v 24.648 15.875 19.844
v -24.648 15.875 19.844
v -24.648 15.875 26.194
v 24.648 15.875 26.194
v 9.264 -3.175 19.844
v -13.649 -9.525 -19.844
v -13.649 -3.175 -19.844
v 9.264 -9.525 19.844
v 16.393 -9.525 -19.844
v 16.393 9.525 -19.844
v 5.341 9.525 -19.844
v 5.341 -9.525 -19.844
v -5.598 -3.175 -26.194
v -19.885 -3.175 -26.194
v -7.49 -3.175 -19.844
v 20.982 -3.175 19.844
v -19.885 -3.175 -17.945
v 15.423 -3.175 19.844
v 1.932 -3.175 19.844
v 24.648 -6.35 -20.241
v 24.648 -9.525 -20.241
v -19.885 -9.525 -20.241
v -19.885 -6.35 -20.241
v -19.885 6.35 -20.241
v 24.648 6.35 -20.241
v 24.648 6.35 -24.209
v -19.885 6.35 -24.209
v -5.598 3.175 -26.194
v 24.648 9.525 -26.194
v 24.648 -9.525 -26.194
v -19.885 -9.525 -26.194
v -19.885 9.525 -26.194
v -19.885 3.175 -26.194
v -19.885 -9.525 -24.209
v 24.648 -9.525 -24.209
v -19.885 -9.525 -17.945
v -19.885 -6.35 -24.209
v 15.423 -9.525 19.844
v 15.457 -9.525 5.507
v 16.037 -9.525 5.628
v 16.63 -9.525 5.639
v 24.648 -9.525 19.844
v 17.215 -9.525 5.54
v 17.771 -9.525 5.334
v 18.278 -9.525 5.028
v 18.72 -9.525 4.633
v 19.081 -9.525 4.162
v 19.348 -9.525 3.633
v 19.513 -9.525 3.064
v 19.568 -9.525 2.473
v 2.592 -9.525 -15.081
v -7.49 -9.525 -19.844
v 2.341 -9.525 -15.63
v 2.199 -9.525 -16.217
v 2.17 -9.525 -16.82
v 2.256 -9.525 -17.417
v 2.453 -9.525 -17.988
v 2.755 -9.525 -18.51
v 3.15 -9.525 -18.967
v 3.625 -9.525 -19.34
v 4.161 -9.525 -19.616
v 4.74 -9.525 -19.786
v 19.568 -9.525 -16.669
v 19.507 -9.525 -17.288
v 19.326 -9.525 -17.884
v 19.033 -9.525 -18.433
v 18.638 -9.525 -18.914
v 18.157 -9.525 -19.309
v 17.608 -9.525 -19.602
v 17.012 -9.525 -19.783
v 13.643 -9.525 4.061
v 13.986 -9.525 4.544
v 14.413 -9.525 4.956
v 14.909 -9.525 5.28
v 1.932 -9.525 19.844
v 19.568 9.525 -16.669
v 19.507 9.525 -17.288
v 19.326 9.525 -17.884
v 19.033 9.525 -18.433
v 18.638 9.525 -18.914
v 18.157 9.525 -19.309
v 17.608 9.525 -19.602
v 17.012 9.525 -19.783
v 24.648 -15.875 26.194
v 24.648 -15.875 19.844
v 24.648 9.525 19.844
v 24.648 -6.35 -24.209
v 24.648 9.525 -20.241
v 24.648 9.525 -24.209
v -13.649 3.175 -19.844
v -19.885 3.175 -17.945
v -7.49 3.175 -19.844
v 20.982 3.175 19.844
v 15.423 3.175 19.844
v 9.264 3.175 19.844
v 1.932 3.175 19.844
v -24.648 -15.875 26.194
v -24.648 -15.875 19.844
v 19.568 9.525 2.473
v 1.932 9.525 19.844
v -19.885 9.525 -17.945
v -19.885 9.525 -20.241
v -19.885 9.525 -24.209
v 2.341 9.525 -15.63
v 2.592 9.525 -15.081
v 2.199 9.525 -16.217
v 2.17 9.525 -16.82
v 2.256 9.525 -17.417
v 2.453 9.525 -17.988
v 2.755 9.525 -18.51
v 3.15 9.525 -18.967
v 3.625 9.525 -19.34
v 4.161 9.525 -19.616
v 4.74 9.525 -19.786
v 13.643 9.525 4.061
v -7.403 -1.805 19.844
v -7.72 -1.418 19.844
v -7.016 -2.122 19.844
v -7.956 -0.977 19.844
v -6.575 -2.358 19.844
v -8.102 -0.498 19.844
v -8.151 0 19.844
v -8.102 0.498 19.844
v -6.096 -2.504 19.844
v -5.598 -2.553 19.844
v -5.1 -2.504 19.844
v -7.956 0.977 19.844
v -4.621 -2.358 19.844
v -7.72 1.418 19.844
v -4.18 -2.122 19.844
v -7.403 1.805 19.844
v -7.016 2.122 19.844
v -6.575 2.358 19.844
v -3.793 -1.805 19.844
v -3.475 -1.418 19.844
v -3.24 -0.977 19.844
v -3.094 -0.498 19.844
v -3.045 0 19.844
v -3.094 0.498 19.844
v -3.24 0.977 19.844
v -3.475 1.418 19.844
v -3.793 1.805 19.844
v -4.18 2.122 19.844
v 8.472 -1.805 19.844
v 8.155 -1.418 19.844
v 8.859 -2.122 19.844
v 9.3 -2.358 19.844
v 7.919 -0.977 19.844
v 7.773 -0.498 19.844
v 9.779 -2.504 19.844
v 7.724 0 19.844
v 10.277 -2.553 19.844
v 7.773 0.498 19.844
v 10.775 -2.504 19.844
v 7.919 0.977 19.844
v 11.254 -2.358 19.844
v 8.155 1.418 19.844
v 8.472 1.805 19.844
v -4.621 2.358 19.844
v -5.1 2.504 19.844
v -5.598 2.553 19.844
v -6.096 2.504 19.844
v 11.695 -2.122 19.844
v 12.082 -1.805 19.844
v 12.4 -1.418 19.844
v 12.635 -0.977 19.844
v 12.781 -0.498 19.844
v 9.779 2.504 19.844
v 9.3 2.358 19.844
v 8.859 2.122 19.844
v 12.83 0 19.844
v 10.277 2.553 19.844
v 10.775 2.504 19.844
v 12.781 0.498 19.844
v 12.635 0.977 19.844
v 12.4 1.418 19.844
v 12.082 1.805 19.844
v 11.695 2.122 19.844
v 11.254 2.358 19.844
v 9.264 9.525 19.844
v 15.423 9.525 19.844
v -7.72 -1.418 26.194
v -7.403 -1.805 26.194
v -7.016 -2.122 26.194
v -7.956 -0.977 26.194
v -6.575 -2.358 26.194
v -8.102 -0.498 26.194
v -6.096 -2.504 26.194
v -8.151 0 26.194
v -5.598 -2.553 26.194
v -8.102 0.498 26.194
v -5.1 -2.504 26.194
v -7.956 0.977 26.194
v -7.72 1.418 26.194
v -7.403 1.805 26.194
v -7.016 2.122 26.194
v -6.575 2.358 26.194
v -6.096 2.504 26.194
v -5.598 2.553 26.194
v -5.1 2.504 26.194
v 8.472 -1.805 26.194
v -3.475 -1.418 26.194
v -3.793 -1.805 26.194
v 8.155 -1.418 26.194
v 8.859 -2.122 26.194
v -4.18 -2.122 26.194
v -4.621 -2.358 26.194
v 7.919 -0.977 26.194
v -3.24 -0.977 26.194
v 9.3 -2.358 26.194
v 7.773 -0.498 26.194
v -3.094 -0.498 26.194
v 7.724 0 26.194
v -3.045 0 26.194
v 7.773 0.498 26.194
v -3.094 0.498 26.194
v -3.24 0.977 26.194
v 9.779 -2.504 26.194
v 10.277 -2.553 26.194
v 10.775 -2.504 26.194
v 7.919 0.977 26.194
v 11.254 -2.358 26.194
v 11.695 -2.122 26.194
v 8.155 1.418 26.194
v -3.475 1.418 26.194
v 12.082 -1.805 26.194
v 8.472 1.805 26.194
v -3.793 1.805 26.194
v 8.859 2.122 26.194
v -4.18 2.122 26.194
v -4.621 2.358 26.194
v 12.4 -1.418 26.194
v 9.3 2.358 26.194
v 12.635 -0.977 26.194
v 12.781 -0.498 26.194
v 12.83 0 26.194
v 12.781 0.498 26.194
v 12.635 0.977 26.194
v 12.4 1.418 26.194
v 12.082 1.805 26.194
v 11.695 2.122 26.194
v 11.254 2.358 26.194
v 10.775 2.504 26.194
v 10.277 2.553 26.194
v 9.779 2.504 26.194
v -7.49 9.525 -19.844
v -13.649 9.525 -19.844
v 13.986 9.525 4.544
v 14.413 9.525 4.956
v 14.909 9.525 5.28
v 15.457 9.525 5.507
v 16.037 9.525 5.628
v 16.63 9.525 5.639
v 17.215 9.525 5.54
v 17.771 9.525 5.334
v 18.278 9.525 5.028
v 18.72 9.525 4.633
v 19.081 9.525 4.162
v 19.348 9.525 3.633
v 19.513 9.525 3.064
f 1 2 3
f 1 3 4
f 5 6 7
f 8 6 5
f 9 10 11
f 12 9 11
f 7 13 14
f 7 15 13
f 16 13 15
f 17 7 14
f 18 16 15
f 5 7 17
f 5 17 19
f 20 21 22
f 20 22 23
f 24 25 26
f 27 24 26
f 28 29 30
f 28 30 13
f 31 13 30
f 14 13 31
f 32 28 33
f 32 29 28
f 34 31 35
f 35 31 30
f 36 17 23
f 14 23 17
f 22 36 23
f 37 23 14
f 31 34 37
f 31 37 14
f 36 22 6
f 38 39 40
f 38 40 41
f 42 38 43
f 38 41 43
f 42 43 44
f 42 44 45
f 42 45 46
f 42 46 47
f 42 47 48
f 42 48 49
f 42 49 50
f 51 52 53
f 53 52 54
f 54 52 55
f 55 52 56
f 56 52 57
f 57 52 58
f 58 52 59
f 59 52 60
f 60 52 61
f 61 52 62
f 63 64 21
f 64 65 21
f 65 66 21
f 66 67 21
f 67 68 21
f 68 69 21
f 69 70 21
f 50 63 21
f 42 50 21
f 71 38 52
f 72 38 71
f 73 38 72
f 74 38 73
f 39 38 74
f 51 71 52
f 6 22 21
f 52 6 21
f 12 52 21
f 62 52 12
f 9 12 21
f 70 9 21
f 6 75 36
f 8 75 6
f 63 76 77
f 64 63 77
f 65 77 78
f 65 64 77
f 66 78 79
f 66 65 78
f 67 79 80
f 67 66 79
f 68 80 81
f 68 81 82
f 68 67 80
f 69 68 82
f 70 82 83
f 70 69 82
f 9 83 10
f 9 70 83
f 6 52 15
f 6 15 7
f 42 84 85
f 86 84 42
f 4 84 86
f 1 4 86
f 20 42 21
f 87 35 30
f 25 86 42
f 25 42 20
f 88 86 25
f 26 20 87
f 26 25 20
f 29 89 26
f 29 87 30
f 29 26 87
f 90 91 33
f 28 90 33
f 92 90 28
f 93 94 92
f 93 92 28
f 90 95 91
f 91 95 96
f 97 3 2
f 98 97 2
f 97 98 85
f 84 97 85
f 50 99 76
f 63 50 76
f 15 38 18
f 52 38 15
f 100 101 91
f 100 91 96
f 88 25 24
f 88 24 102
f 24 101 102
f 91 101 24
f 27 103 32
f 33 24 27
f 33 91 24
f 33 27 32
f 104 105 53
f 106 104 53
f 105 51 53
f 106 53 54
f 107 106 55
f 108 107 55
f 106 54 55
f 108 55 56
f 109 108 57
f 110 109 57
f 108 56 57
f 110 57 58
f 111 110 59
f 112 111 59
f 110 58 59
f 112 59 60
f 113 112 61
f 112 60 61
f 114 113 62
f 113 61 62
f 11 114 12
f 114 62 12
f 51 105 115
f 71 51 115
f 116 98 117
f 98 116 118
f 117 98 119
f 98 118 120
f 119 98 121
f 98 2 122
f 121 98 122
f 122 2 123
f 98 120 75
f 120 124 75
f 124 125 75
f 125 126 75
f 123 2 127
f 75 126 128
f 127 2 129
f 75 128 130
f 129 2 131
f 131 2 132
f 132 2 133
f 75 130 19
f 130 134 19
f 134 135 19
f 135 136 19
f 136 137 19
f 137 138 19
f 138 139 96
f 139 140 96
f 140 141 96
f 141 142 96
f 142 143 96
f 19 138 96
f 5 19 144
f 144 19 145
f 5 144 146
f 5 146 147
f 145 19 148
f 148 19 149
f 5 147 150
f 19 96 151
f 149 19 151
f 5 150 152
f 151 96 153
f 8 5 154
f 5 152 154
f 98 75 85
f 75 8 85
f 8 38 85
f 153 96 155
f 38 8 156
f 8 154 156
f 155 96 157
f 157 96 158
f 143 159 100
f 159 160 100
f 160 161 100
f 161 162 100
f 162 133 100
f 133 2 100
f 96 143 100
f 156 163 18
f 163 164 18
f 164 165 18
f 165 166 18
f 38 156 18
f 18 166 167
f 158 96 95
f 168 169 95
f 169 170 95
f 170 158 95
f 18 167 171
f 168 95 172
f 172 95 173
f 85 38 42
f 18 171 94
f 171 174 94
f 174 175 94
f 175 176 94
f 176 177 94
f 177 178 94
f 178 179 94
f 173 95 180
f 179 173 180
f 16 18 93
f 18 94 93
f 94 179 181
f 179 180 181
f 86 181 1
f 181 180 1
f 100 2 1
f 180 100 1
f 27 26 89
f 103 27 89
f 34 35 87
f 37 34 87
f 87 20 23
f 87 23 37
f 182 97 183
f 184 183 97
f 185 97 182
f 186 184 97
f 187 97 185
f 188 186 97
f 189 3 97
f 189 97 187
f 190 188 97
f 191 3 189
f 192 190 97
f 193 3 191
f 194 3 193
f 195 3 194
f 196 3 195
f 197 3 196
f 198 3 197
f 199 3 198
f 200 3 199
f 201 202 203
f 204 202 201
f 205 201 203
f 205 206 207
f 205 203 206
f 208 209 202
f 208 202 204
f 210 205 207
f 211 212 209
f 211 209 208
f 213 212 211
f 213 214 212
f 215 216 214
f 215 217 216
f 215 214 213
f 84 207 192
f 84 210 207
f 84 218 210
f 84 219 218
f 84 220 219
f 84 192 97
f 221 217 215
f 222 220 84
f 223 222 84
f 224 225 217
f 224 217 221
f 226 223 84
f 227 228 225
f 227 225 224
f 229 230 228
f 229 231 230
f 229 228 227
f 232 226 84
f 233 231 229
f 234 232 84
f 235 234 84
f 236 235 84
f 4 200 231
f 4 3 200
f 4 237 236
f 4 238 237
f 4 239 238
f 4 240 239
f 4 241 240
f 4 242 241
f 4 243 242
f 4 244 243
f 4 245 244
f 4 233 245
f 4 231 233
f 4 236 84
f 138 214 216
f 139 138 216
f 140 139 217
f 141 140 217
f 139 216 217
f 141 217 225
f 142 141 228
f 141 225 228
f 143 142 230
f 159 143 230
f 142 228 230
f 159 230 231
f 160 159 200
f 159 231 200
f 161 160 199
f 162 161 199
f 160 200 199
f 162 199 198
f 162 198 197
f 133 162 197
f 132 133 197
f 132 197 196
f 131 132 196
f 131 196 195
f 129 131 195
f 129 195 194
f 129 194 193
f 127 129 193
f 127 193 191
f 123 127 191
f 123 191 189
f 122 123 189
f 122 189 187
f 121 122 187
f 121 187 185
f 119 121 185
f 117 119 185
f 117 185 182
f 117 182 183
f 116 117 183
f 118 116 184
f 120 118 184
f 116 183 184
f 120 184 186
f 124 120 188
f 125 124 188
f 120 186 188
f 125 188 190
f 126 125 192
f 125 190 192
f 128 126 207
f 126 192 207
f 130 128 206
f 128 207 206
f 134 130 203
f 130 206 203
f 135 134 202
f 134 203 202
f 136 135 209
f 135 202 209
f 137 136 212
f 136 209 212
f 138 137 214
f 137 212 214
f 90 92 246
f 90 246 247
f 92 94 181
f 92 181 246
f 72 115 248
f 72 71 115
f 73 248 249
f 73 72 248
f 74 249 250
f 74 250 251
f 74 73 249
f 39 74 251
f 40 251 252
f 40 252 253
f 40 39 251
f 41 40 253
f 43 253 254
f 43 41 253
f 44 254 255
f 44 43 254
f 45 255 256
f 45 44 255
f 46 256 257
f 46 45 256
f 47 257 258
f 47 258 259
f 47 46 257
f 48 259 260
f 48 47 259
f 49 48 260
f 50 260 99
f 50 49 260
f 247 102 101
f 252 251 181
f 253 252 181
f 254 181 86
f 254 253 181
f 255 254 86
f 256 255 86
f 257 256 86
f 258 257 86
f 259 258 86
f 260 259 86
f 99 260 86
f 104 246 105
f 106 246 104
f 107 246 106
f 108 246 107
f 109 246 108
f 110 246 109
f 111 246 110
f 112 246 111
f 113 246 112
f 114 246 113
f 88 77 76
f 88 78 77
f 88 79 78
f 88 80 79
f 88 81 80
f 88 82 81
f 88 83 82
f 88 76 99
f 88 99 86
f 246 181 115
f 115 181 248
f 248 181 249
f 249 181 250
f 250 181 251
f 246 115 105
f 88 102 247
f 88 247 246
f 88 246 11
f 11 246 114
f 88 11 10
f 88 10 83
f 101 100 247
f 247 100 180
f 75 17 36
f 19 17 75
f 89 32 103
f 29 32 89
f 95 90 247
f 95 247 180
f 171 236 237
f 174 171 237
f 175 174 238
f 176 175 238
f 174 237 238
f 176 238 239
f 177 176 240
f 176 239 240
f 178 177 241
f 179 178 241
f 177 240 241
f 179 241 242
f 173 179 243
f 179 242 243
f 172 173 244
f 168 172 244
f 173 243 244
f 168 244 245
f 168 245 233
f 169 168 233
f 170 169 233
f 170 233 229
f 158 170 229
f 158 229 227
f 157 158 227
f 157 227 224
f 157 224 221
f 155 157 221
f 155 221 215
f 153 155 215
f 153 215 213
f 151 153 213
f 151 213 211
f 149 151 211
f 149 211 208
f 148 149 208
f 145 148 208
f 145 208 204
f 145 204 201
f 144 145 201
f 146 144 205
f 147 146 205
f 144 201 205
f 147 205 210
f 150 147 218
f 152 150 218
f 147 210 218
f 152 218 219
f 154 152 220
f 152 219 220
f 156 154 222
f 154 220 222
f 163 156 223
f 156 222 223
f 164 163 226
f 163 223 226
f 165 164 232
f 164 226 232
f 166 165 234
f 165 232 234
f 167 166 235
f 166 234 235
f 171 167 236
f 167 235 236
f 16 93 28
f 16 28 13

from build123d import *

# Parameters (mm, degrees)
BOSS_EXTRUDE1_DEPTH     = 9.525
SKETCH2_3_W             = 49.295937228
SKETCH2_3_H             = 6.35
BOSS_EXTRUDE2_DEPTH     = 15.875
SKETCH10_W              = 19.05
SKETCH10_H              = 6.35
CUT_EXTRUDE1_DEPTH      = 45.031748726
CUT_EXTRUDE1_DEPTH_BACK = 45.031748726
CUT_EXTRUDE2_DEPTH      = 45.031748726
CUT_EXTRUDE2_DEPTH_BACK = 45.031748726
CUT_EXTRUDE3_REACH      = 62.033
SKETCH14_R              = 2.5527
CUT_EXTRUDE4_DEPTH      = 45.031748726
FILLET1_R               = 3.175
SKETCH17_W              = 3.96875
SKETCH17_H              = 3.175
CUT_EXTRUDE5_DEPTH      = 59.036347156


with BuildPart() as part:
    # Sketch2 → Boss-Extrude1 (new, symmetric)
    with BuildSketch(Plane(origin=(0, 0, 0), x_dir=(1, 0, 0), z_dir=(0, 1, 0))):
        Polygon((24.647968614, 26.19375), (-24.647968614, 26.19375), (1.931794404, -19.84375), (24.647968614, -19.84375), align=None)
    extrude(amount=BOSS_EXTRUDE1_DEPTH, both=True)

    # Sketch2<3> → Boss-Extrude2 (add, symmetric)
    with BuildSketch(Plane(origin=(0, 0, 0), x_dir=(1, 0, 0), z_dir=(0, 1, 0))):
        with Locations((0, -23.01875)):
            Rectangle(SKETCH2_3_W, SKETCH2_3_H)
    extrude(amount=BOSS_EXTRUDE2_DEPTH, both=True)

    # Cut-Sweep1: sweep along a curve in space
    with BuildLine() as cut_sweep1_path:
        Line((-24.647968614, 9.525, -26.19375), (1.931794404, 9.525, 19.84375))
    # Sketch10 → Cut-Sweep1 (sweep, cut)
    with BuildSketch(Plane(origin=(0, 0, -26.19375), x_dir=(-1, 0, 0), z_dir=(0, 0, -1))):
        with Locations((15.122968614, 0)):
            Rectangle(SKETCH10_W, SKETCH10_H)
    sweep(path=cut_sweep1_path.line, mode=Mode.SUBTRACT)

    # Sketch11 → Cut-Extrude1 (cut, two sides: drawn at the far end of the back side and taken through both)
    with BuildSketch(Plane(origin=(0, 9.525, 0), x_dir=(1, 0, 0), z_dir=(0, 1, 0)).offset(-CUT_EXTRUDE1_DEPTH_BACK)):
        Polygon((-19.885468614, 26.19375), (-24.647968614, 26.19375), (-19.885468614, 17.944858029), align=None)
    extrude(amount=CUT_EXTRUDE1_DEPTH + CUT_EXTRUDE1_DEPTH_BACK, mode=Mode.SUBTRACT)

    # Sketch13 → Cut-Extrude2 (cut, two sides: drawn at the far end of the back side and taken through both)
    with BuildSketch(Plane(origin=(0, 9.525, 0), x_dir=(1, 0, 0), z_dir=(0, 1, 0)).offset(-CUT_EXTRUDE2_DEPTH_BACK)):
        Polygon((-13.649445986, 19.84375), (9.264142823, -19.84375), (15.423315495, -19.84375), (-7.490273314, 19.84375), align=None)
    extrude(amount=CUT_EXTRUDE2_DEPTH + CUT_EXTRUDE2_DEPTH_BACK, mode=Mode.SUBTRACT)

    # Sketch14 → Cut-Extrude3 (cut, up to next)
    with BuildSketch(Plane.XY.offset(26.19375), mode=Mode.PRIVATE) as cut_extrude3_sk1:
        with Locations((10.277031386, 0)):
            Circle(SKETCH14_R)
    cut_extrude3_tool1 = extrude(cut_extrude3_sk1.sketch, amount=-CUT_EXTRUDE3_REACH, mode=Mode.PRIVATE) & part.part
    # Sketch14 → Cut-Extrude3 (cut, up to next)
    with BuildSketch(Plane.XY.offset(26.19375), mode=Mode.PRIVATE) as cut_extrude3_sk2:
        with Locations((-5.597968614, 0)):
            Circle(SKETCH14_R)
    cut_extrude3_tool2 = extrude(cut_extrude3_sk2.sketch, amount=-CUT_EXTRUDE3_REACH, mode=Mode.PRIVATE) & part.part
    add(cut_extrude3_tool1.solids().sort_by_distance((10.277031, 0, 26.19375))[0], mode=Mode.SUBTRACT)
    add(cut_extrude3_tool2.solids().sort_by_distance((-5.597969, 0, 26.19375))[0], mode=Mode.SUBTRACT)

    # Sketch16 → Cut-Extrude4 (cut, through all)
    with BuildSketch(Plane(origin=(0, 9.525, 0), x_dir=(1, 0, 0), z_dir=(0, 1, 0))):
        Polygon((-0.157924895, 19.84375), (19.567968614, -14.322499782), (19.567968614, 19.84375), align=None)
    extrude(amount=-CUT_EXTRUDE4_DEPTH, mode=Mode.SUBTRACT)

    # Fillet1
    fillet1_edges = [part.edges().sort_by_distance(p)[0] for p in [
        (-0.157924895, 0, -19.84375),
        (19.567968614, 0, -19.84375),
        (19.567968614, 0, 14.322499782),
    ]]
    fillet(fillet1_edges, radius=FILLET1_R)

    # Sketch17 → Cut-Extrude5 (cut, through all)
    with BuildSketch(Plane(origin=(24.647968614, 0, 0), x_dir=(0, 0, -1), z_dir=(1, 0, 0))):
        with Locations((22.225, 7.9375)):
            Rectangle(SKETCH17_W, SKETCH17_H)
        with Locations((22.225, -7.9375)):
            Rectangle(SKETCH17_W, SKETCH17_H)
    extrude(amount=-CUT_EXTRUDE5_DEPTH, mode=Mode.SUBTRACT)


solid = part.part
